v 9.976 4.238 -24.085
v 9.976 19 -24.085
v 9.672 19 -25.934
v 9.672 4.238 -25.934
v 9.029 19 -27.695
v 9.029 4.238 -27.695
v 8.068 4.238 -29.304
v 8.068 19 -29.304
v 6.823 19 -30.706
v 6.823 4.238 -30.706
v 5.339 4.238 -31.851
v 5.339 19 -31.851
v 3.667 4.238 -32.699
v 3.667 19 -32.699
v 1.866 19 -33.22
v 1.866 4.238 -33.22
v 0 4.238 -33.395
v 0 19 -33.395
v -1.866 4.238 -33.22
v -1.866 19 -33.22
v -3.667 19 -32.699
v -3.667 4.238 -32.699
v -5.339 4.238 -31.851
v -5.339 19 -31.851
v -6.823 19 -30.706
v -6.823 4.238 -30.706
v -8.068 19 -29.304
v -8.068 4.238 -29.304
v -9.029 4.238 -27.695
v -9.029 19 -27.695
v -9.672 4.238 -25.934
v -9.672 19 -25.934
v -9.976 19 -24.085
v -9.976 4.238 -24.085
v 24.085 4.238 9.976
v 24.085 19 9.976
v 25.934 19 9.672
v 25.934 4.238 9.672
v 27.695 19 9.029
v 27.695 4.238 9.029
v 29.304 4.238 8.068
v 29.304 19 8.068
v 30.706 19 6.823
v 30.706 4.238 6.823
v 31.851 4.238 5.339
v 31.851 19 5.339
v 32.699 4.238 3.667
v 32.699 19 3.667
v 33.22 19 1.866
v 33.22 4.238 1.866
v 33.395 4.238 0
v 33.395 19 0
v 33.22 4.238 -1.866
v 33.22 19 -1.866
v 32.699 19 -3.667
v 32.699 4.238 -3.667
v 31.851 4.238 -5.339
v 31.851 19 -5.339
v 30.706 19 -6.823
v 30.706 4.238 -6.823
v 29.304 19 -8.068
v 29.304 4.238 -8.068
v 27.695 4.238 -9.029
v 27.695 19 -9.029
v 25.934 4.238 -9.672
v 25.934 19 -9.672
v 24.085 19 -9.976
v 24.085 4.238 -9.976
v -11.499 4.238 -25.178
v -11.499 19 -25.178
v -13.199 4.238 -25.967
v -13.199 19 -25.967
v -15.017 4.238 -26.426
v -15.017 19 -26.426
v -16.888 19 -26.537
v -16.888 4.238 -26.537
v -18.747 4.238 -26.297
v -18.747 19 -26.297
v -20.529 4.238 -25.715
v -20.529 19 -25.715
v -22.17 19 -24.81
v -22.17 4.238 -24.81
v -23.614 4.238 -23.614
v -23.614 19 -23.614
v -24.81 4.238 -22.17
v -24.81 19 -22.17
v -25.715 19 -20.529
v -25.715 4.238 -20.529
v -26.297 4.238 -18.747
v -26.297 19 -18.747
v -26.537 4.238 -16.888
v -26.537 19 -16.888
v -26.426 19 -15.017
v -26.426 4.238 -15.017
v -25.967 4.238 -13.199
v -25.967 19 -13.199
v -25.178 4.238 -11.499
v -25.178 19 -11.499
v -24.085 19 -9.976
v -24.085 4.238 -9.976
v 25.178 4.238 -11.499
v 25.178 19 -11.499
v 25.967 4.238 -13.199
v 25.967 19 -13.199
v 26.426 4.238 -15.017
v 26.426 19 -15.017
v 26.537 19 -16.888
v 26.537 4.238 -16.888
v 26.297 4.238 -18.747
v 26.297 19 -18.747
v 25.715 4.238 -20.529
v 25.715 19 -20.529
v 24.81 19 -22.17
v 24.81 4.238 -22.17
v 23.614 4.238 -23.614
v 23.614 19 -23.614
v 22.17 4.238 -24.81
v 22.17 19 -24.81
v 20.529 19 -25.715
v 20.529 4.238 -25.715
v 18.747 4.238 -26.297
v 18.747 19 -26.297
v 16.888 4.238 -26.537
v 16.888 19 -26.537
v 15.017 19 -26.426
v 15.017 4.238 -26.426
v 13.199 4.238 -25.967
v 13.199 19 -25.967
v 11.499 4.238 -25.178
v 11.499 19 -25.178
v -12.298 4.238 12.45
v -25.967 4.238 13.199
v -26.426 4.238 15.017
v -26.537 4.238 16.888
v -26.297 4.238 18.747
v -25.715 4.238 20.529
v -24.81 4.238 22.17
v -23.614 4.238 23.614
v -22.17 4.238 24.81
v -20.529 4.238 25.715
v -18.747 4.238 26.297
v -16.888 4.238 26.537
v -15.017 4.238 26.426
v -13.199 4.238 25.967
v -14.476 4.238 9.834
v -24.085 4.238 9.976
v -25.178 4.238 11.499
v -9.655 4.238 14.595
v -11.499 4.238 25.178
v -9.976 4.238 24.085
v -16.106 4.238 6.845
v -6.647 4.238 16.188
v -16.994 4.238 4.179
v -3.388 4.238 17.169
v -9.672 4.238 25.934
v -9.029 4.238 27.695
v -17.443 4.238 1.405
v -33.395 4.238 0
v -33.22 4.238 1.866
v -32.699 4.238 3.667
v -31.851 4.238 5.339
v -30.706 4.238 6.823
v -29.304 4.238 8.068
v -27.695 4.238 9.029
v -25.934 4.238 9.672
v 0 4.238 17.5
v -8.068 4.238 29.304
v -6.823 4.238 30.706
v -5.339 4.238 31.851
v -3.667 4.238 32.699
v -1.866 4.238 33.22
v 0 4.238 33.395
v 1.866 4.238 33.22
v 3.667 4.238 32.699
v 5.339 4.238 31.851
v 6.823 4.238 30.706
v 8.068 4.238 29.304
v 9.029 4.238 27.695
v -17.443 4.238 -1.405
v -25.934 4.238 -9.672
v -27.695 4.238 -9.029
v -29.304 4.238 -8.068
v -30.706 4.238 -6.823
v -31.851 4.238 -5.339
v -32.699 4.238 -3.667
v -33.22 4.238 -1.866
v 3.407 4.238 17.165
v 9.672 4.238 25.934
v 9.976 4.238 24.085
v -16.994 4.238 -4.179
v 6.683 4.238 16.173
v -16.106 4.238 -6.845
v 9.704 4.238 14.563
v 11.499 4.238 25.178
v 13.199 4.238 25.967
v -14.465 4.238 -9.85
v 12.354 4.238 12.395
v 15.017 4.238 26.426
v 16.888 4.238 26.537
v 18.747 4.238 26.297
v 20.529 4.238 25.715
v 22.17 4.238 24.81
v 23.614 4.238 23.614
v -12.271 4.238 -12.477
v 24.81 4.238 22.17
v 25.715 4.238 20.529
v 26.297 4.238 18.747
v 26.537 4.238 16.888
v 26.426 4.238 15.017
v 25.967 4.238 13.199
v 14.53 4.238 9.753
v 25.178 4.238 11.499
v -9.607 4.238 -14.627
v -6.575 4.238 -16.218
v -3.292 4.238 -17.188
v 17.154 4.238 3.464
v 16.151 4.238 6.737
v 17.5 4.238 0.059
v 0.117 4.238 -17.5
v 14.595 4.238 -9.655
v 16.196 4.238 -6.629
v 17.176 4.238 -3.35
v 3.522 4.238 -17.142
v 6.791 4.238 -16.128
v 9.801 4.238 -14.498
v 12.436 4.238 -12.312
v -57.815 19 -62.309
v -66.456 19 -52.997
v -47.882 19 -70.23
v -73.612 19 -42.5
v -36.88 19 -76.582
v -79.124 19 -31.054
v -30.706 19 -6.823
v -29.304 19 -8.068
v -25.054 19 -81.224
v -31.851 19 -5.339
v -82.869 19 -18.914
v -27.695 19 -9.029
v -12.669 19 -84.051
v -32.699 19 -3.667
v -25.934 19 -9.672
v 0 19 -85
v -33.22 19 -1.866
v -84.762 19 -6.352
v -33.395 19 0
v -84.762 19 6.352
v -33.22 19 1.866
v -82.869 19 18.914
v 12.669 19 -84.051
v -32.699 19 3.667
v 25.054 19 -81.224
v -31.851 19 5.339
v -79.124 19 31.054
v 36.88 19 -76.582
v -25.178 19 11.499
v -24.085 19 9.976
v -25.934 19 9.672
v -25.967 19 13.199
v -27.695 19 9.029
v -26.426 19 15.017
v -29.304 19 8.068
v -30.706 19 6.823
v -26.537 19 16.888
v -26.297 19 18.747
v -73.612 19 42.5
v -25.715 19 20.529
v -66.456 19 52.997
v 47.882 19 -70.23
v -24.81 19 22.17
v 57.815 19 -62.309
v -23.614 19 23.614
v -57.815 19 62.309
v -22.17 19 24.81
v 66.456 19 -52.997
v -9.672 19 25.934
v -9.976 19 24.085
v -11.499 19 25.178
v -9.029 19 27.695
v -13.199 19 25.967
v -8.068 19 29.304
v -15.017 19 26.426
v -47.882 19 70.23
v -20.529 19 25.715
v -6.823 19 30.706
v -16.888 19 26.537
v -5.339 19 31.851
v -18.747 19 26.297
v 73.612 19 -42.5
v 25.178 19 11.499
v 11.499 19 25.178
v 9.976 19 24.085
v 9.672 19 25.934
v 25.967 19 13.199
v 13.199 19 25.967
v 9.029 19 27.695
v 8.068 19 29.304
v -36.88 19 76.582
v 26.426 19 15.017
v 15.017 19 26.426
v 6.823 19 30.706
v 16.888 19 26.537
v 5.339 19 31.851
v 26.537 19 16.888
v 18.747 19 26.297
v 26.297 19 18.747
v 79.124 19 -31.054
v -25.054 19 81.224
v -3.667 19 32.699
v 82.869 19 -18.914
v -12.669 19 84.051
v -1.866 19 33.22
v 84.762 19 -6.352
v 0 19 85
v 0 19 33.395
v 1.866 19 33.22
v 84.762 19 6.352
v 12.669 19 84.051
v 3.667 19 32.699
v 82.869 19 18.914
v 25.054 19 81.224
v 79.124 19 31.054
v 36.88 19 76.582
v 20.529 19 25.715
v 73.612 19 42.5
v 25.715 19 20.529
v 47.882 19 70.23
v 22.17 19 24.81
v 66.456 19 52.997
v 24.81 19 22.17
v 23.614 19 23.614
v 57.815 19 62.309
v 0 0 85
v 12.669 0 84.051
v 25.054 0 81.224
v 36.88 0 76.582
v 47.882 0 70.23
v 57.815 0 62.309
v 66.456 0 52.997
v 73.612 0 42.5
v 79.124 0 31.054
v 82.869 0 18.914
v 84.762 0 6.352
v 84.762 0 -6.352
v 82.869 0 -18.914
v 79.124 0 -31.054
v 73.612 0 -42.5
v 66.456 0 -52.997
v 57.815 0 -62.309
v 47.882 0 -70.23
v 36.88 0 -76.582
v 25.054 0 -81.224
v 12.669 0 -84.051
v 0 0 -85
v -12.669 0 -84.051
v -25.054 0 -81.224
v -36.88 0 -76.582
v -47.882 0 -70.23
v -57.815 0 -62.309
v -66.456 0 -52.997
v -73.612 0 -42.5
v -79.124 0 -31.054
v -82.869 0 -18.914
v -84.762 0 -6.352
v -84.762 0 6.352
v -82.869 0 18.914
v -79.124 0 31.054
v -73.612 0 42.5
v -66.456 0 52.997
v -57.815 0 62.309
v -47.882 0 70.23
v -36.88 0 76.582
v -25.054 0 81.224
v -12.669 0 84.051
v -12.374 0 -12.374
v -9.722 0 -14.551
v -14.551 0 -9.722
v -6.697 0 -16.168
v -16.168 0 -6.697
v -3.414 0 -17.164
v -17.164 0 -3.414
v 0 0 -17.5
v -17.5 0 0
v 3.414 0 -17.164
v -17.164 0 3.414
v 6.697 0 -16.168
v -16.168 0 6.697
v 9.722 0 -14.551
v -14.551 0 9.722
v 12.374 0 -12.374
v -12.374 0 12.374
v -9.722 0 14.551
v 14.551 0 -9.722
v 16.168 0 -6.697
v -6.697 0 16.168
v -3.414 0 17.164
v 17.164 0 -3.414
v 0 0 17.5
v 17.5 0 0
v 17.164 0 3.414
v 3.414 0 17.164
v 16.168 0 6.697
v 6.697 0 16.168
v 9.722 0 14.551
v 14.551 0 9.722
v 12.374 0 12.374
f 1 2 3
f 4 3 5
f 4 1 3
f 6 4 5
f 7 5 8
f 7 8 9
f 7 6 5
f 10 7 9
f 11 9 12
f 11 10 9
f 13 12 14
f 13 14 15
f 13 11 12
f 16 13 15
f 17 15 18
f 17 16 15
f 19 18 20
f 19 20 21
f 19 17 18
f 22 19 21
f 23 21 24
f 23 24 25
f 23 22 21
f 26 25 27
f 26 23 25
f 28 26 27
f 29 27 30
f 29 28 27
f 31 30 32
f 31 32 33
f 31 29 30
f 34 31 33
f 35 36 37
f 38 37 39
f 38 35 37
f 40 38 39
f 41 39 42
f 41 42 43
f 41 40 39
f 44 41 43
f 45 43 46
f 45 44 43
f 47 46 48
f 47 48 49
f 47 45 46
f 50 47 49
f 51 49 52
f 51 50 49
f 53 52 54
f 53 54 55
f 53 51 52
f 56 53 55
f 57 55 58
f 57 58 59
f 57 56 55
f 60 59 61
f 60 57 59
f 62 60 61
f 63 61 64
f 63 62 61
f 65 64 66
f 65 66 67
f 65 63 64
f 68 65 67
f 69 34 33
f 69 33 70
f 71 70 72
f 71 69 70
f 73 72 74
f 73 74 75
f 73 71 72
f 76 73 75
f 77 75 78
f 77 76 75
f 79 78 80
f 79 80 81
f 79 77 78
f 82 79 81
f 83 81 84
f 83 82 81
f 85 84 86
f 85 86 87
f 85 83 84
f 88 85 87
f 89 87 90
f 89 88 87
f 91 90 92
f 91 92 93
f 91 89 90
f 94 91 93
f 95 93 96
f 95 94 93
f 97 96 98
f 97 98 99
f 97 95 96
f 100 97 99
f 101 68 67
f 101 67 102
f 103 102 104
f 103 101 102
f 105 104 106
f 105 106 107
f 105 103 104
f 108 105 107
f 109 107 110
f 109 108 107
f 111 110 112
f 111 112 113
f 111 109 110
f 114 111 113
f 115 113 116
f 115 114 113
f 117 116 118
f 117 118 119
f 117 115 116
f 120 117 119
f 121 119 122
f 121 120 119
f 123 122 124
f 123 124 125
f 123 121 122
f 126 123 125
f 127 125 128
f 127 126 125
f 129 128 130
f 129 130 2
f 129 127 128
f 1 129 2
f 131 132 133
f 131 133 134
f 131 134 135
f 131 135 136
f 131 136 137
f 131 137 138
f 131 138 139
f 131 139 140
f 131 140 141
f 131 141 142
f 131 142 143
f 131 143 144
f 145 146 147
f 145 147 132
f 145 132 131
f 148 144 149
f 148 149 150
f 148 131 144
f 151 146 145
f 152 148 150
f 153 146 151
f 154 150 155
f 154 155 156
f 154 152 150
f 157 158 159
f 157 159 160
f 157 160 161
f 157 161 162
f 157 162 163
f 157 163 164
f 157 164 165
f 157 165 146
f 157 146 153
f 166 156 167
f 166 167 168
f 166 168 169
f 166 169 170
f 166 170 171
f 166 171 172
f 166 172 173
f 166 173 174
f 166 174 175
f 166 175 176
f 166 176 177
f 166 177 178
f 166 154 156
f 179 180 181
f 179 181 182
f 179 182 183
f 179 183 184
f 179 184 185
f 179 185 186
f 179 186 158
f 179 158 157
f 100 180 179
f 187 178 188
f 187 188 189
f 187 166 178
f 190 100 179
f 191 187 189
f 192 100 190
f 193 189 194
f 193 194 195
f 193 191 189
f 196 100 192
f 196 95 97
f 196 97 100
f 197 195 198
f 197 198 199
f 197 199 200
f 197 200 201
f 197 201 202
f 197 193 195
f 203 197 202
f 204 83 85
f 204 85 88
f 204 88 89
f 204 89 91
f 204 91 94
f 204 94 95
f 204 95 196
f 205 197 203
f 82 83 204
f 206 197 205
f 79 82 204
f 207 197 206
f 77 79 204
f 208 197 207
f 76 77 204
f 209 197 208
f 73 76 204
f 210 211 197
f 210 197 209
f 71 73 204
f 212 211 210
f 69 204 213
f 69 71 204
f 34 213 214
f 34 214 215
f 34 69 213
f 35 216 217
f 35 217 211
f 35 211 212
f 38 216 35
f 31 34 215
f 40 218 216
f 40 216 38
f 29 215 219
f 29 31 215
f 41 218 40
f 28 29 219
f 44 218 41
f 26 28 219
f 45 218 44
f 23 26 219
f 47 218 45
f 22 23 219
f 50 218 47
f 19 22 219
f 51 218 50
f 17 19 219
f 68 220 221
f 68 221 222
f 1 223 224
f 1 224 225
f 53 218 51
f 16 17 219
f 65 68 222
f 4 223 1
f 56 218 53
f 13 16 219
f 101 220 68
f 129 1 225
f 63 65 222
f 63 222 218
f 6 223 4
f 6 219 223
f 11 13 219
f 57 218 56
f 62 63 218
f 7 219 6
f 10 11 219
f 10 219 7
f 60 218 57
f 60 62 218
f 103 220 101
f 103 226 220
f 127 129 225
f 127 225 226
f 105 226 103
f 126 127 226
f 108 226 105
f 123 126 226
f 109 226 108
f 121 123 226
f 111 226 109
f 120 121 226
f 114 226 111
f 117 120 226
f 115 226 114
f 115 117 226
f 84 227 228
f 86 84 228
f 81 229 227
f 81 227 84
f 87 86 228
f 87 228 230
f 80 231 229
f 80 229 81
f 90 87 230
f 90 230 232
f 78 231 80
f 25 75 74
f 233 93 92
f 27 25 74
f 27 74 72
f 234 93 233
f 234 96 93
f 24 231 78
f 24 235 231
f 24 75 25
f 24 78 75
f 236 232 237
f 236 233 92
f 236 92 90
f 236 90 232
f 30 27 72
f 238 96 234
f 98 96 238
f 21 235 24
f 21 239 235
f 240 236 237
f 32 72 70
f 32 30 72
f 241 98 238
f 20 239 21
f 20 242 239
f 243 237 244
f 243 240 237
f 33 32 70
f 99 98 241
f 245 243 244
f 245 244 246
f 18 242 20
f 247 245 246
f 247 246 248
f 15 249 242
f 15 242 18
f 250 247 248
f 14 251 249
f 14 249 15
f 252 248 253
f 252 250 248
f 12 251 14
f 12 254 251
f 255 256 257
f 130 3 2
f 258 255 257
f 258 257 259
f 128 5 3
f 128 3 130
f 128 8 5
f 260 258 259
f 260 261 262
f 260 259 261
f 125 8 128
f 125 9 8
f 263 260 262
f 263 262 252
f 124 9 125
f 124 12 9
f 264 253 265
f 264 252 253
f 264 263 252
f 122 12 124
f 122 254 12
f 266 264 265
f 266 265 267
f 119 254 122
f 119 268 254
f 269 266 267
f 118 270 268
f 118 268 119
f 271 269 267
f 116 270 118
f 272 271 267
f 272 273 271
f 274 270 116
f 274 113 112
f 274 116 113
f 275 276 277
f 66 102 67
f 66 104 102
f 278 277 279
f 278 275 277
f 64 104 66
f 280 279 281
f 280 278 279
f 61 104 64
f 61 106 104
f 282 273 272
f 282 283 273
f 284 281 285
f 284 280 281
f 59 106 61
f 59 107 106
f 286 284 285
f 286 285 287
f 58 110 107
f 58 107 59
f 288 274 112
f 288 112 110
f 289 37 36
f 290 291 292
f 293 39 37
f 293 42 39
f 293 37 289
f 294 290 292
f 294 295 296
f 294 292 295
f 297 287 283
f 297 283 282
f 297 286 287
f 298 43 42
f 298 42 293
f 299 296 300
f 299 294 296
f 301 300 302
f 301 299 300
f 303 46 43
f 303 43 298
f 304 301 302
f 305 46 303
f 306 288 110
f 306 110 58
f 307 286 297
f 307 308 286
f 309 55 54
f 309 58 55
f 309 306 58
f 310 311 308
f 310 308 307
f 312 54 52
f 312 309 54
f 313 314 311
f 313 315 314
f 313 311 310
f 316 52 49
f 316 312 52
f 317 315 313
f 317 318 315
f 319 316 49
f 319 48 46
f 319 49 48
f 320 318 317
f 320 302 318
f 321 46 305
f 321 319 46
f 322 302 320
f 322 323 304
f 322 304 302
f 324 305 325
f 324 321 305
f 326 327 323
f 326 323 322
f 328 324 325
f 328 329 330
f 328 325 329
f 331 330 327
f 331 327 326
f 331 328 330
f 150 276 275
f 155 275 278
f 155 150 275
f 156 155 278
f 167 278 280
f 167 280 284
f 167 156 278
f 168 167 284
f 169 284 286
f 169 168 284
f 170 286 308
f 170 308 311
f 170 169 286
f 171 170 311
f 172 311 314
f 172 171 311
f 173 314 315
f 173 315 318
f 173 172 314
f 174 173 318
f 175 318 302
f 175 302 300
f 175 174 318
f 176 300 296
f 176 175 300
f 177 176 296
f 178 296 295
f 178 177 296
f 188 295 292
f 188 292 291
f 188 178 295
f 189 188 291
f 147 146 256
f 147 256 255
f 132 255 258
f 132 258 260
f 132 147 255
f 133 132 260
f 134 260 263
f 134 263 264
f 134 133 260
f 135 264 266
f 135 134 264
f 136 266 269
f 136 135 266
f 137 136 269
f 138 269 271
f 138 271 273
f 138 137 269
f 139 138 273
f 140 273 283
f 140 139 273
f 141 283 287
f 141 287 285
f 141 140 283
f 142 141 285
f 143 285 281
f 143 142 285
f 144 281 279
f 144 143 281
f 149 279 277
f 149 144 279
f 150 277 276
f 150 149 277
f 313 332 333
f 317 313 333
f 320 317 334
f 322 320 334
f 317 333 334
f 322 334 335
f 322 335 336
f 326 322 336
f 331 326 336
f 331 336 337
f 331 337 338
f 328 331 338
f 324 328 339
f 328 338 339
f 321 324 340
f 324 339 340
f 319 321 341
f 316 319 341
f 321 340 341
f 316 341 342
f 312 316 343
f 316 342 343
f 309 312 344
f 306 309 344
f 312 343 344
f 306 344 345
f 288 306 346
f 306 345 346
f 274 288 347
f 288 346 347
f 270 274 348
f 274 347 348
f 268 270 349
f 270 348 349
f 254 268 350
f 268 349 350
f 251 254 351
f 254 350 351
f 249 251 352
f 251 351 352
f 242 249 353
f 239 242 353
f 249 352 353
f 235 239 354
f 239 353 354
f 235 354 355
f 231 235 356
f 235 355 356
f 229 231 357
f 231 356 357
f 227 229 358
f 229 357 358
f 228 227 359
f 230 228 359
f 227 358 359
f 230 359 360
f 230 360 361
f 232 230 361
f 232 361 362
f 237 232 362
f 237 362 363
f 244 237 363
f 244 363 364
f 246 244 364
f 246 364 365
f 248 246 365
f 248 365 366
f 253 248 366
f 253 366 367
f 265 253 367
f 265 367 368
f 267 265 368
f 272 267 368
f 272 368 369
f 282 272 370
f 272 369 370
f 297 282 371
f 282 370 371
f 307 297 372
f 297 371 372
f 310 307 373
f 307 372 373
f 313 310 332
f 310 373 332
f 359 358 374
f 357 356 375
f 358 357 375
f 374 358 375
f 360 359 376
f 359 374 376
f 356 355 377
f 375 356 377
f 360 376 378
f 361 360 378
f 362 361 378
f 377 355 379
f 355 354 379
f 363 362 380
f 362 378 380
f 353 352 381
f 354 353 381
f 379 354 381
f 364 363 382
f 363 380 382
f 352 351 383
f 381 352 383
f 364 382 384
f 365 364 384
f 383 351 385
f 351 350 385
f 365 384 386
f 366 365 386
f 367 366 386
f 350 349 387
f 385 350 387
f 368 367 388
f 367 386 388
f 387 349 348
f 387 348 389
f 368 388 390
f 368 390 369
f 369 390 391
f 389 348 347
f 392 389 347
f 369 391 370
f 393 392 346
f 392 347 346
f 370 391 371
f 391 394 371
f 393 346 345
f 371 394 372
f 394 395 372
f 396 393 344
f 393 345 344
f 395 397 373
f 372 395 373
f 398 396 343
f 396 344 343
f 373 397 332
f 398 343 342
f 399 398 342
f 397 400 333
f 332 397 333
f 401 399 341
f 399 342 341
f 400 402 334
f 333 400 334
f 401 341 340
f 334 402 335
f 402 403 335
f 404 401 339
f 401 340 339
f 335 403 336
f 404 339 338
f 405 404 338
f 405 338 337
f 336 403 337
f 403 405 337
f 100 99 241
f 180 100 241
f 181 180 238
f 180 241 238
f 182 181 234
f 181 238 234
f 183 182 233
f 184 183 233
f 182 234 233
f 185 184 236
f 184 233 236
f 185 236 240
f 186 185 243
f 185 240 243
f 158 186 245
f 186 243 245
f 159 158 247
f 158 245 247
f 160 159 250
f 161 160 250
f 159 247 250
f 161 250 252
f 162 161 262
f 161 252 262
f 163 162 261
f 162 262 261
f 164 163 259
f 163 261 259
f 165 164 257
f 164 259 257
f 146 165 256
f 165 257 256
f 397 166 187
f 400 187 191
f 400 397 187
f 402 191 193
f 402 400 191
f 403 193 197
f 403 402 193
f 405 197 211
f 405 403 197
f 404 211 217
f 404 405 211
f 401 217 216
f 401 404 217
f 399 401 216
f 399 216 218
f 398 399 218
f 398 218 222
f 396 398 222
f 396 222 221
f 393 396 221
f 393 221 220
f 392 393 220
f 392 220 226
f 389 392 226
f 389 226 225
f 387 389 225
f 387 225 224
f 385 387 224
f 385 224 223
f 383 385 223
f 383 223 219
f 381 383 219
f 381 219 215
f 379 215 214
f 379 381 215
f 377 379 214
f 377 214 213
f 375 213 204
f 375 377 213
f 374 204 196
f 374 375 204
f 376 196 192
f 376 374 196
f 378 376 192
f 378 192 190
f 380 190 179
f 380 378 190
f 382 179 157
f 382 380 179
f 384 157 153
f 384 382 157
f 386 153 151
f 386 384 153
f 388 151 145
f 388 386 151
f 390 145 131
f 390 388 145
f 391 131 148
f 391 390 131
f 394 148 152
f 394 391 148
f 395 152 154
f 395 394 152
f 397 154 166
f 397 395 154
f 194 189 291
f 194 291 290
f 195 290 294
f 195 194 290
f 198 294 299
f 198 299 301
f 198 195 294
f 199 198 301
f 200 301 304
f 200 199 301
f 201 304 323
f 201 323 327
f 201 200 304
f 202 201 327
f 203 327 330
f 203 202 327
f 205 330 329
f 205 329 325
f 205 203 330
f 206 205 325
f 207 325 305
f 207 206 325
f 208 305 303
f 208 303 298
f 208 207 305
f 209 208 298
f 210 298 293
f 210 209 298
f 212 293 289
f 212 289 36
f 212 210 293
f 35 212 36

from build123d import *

# Parameters (mm, degrees)
SKETCH1_R           = 85
BOSS_EXTRUDE1_DEPTH = 19
SKETCH2_R           = 17.5
CUT_EXTRUDE1_DEPTH  = 122.70045193
SKETCH3_R           = 10
CUT_EXTRUDE2_DEPTH  = 14.761809073
CIRPATTERN1_COUNT   = 8


with BuildPart() as part:
    # Sketch1 → Boss-Extrude1 (new body)
    with BuildSketch(Plane(origin=(0, 0, 0), x_dir=(1, 0, 0), z_dir=(0, 1, 0))):
        Circle(SKETCH1_R)
    extrude(amount=BOSS_EXTRUDE1_DEPTH)

    # Sketch2 → Cut-Extrude1 (cut, through all)
    with BuildSketch(Plane(origin=(0, 0, 0), x_dir=(1, 0, 0), z_dir=(0, 1, 0))):
        Circle(SKETCH2_R)
    extrude(amount=CUT_EXTRUDE1_DEPTH, mode=Mode.SUBTRACT)

    # Sketch3 → Cut-Extrude2 (cut)
    with BuildSketch(Plane(origin=(0, 19, 0), x_dir=(1, 0, 0), z_dir=(0, 1, 0))):
        with Locations((-23.395464248, 0)):
            Circle(SKETCH3_R)
    cut_extrude2 = extrude(amount=-CUT_EXTRUDE2_DEPTH, mode=Mode.SUBTRACT)

    # CirPattern1: Cut-Extrude2 ×8 about axis
    cirpattern1_axis = Axis((0, 0, 0), (0, 1, 0))
    for i in range(1, CIRPATTERN1_COUNT):
        add(cut_extrude2.rotate(cirpattern1_axis, i * 360 / CIRPATTERN1_COUNT), mode=Mode.SUBTRACT)


solid = part.part
